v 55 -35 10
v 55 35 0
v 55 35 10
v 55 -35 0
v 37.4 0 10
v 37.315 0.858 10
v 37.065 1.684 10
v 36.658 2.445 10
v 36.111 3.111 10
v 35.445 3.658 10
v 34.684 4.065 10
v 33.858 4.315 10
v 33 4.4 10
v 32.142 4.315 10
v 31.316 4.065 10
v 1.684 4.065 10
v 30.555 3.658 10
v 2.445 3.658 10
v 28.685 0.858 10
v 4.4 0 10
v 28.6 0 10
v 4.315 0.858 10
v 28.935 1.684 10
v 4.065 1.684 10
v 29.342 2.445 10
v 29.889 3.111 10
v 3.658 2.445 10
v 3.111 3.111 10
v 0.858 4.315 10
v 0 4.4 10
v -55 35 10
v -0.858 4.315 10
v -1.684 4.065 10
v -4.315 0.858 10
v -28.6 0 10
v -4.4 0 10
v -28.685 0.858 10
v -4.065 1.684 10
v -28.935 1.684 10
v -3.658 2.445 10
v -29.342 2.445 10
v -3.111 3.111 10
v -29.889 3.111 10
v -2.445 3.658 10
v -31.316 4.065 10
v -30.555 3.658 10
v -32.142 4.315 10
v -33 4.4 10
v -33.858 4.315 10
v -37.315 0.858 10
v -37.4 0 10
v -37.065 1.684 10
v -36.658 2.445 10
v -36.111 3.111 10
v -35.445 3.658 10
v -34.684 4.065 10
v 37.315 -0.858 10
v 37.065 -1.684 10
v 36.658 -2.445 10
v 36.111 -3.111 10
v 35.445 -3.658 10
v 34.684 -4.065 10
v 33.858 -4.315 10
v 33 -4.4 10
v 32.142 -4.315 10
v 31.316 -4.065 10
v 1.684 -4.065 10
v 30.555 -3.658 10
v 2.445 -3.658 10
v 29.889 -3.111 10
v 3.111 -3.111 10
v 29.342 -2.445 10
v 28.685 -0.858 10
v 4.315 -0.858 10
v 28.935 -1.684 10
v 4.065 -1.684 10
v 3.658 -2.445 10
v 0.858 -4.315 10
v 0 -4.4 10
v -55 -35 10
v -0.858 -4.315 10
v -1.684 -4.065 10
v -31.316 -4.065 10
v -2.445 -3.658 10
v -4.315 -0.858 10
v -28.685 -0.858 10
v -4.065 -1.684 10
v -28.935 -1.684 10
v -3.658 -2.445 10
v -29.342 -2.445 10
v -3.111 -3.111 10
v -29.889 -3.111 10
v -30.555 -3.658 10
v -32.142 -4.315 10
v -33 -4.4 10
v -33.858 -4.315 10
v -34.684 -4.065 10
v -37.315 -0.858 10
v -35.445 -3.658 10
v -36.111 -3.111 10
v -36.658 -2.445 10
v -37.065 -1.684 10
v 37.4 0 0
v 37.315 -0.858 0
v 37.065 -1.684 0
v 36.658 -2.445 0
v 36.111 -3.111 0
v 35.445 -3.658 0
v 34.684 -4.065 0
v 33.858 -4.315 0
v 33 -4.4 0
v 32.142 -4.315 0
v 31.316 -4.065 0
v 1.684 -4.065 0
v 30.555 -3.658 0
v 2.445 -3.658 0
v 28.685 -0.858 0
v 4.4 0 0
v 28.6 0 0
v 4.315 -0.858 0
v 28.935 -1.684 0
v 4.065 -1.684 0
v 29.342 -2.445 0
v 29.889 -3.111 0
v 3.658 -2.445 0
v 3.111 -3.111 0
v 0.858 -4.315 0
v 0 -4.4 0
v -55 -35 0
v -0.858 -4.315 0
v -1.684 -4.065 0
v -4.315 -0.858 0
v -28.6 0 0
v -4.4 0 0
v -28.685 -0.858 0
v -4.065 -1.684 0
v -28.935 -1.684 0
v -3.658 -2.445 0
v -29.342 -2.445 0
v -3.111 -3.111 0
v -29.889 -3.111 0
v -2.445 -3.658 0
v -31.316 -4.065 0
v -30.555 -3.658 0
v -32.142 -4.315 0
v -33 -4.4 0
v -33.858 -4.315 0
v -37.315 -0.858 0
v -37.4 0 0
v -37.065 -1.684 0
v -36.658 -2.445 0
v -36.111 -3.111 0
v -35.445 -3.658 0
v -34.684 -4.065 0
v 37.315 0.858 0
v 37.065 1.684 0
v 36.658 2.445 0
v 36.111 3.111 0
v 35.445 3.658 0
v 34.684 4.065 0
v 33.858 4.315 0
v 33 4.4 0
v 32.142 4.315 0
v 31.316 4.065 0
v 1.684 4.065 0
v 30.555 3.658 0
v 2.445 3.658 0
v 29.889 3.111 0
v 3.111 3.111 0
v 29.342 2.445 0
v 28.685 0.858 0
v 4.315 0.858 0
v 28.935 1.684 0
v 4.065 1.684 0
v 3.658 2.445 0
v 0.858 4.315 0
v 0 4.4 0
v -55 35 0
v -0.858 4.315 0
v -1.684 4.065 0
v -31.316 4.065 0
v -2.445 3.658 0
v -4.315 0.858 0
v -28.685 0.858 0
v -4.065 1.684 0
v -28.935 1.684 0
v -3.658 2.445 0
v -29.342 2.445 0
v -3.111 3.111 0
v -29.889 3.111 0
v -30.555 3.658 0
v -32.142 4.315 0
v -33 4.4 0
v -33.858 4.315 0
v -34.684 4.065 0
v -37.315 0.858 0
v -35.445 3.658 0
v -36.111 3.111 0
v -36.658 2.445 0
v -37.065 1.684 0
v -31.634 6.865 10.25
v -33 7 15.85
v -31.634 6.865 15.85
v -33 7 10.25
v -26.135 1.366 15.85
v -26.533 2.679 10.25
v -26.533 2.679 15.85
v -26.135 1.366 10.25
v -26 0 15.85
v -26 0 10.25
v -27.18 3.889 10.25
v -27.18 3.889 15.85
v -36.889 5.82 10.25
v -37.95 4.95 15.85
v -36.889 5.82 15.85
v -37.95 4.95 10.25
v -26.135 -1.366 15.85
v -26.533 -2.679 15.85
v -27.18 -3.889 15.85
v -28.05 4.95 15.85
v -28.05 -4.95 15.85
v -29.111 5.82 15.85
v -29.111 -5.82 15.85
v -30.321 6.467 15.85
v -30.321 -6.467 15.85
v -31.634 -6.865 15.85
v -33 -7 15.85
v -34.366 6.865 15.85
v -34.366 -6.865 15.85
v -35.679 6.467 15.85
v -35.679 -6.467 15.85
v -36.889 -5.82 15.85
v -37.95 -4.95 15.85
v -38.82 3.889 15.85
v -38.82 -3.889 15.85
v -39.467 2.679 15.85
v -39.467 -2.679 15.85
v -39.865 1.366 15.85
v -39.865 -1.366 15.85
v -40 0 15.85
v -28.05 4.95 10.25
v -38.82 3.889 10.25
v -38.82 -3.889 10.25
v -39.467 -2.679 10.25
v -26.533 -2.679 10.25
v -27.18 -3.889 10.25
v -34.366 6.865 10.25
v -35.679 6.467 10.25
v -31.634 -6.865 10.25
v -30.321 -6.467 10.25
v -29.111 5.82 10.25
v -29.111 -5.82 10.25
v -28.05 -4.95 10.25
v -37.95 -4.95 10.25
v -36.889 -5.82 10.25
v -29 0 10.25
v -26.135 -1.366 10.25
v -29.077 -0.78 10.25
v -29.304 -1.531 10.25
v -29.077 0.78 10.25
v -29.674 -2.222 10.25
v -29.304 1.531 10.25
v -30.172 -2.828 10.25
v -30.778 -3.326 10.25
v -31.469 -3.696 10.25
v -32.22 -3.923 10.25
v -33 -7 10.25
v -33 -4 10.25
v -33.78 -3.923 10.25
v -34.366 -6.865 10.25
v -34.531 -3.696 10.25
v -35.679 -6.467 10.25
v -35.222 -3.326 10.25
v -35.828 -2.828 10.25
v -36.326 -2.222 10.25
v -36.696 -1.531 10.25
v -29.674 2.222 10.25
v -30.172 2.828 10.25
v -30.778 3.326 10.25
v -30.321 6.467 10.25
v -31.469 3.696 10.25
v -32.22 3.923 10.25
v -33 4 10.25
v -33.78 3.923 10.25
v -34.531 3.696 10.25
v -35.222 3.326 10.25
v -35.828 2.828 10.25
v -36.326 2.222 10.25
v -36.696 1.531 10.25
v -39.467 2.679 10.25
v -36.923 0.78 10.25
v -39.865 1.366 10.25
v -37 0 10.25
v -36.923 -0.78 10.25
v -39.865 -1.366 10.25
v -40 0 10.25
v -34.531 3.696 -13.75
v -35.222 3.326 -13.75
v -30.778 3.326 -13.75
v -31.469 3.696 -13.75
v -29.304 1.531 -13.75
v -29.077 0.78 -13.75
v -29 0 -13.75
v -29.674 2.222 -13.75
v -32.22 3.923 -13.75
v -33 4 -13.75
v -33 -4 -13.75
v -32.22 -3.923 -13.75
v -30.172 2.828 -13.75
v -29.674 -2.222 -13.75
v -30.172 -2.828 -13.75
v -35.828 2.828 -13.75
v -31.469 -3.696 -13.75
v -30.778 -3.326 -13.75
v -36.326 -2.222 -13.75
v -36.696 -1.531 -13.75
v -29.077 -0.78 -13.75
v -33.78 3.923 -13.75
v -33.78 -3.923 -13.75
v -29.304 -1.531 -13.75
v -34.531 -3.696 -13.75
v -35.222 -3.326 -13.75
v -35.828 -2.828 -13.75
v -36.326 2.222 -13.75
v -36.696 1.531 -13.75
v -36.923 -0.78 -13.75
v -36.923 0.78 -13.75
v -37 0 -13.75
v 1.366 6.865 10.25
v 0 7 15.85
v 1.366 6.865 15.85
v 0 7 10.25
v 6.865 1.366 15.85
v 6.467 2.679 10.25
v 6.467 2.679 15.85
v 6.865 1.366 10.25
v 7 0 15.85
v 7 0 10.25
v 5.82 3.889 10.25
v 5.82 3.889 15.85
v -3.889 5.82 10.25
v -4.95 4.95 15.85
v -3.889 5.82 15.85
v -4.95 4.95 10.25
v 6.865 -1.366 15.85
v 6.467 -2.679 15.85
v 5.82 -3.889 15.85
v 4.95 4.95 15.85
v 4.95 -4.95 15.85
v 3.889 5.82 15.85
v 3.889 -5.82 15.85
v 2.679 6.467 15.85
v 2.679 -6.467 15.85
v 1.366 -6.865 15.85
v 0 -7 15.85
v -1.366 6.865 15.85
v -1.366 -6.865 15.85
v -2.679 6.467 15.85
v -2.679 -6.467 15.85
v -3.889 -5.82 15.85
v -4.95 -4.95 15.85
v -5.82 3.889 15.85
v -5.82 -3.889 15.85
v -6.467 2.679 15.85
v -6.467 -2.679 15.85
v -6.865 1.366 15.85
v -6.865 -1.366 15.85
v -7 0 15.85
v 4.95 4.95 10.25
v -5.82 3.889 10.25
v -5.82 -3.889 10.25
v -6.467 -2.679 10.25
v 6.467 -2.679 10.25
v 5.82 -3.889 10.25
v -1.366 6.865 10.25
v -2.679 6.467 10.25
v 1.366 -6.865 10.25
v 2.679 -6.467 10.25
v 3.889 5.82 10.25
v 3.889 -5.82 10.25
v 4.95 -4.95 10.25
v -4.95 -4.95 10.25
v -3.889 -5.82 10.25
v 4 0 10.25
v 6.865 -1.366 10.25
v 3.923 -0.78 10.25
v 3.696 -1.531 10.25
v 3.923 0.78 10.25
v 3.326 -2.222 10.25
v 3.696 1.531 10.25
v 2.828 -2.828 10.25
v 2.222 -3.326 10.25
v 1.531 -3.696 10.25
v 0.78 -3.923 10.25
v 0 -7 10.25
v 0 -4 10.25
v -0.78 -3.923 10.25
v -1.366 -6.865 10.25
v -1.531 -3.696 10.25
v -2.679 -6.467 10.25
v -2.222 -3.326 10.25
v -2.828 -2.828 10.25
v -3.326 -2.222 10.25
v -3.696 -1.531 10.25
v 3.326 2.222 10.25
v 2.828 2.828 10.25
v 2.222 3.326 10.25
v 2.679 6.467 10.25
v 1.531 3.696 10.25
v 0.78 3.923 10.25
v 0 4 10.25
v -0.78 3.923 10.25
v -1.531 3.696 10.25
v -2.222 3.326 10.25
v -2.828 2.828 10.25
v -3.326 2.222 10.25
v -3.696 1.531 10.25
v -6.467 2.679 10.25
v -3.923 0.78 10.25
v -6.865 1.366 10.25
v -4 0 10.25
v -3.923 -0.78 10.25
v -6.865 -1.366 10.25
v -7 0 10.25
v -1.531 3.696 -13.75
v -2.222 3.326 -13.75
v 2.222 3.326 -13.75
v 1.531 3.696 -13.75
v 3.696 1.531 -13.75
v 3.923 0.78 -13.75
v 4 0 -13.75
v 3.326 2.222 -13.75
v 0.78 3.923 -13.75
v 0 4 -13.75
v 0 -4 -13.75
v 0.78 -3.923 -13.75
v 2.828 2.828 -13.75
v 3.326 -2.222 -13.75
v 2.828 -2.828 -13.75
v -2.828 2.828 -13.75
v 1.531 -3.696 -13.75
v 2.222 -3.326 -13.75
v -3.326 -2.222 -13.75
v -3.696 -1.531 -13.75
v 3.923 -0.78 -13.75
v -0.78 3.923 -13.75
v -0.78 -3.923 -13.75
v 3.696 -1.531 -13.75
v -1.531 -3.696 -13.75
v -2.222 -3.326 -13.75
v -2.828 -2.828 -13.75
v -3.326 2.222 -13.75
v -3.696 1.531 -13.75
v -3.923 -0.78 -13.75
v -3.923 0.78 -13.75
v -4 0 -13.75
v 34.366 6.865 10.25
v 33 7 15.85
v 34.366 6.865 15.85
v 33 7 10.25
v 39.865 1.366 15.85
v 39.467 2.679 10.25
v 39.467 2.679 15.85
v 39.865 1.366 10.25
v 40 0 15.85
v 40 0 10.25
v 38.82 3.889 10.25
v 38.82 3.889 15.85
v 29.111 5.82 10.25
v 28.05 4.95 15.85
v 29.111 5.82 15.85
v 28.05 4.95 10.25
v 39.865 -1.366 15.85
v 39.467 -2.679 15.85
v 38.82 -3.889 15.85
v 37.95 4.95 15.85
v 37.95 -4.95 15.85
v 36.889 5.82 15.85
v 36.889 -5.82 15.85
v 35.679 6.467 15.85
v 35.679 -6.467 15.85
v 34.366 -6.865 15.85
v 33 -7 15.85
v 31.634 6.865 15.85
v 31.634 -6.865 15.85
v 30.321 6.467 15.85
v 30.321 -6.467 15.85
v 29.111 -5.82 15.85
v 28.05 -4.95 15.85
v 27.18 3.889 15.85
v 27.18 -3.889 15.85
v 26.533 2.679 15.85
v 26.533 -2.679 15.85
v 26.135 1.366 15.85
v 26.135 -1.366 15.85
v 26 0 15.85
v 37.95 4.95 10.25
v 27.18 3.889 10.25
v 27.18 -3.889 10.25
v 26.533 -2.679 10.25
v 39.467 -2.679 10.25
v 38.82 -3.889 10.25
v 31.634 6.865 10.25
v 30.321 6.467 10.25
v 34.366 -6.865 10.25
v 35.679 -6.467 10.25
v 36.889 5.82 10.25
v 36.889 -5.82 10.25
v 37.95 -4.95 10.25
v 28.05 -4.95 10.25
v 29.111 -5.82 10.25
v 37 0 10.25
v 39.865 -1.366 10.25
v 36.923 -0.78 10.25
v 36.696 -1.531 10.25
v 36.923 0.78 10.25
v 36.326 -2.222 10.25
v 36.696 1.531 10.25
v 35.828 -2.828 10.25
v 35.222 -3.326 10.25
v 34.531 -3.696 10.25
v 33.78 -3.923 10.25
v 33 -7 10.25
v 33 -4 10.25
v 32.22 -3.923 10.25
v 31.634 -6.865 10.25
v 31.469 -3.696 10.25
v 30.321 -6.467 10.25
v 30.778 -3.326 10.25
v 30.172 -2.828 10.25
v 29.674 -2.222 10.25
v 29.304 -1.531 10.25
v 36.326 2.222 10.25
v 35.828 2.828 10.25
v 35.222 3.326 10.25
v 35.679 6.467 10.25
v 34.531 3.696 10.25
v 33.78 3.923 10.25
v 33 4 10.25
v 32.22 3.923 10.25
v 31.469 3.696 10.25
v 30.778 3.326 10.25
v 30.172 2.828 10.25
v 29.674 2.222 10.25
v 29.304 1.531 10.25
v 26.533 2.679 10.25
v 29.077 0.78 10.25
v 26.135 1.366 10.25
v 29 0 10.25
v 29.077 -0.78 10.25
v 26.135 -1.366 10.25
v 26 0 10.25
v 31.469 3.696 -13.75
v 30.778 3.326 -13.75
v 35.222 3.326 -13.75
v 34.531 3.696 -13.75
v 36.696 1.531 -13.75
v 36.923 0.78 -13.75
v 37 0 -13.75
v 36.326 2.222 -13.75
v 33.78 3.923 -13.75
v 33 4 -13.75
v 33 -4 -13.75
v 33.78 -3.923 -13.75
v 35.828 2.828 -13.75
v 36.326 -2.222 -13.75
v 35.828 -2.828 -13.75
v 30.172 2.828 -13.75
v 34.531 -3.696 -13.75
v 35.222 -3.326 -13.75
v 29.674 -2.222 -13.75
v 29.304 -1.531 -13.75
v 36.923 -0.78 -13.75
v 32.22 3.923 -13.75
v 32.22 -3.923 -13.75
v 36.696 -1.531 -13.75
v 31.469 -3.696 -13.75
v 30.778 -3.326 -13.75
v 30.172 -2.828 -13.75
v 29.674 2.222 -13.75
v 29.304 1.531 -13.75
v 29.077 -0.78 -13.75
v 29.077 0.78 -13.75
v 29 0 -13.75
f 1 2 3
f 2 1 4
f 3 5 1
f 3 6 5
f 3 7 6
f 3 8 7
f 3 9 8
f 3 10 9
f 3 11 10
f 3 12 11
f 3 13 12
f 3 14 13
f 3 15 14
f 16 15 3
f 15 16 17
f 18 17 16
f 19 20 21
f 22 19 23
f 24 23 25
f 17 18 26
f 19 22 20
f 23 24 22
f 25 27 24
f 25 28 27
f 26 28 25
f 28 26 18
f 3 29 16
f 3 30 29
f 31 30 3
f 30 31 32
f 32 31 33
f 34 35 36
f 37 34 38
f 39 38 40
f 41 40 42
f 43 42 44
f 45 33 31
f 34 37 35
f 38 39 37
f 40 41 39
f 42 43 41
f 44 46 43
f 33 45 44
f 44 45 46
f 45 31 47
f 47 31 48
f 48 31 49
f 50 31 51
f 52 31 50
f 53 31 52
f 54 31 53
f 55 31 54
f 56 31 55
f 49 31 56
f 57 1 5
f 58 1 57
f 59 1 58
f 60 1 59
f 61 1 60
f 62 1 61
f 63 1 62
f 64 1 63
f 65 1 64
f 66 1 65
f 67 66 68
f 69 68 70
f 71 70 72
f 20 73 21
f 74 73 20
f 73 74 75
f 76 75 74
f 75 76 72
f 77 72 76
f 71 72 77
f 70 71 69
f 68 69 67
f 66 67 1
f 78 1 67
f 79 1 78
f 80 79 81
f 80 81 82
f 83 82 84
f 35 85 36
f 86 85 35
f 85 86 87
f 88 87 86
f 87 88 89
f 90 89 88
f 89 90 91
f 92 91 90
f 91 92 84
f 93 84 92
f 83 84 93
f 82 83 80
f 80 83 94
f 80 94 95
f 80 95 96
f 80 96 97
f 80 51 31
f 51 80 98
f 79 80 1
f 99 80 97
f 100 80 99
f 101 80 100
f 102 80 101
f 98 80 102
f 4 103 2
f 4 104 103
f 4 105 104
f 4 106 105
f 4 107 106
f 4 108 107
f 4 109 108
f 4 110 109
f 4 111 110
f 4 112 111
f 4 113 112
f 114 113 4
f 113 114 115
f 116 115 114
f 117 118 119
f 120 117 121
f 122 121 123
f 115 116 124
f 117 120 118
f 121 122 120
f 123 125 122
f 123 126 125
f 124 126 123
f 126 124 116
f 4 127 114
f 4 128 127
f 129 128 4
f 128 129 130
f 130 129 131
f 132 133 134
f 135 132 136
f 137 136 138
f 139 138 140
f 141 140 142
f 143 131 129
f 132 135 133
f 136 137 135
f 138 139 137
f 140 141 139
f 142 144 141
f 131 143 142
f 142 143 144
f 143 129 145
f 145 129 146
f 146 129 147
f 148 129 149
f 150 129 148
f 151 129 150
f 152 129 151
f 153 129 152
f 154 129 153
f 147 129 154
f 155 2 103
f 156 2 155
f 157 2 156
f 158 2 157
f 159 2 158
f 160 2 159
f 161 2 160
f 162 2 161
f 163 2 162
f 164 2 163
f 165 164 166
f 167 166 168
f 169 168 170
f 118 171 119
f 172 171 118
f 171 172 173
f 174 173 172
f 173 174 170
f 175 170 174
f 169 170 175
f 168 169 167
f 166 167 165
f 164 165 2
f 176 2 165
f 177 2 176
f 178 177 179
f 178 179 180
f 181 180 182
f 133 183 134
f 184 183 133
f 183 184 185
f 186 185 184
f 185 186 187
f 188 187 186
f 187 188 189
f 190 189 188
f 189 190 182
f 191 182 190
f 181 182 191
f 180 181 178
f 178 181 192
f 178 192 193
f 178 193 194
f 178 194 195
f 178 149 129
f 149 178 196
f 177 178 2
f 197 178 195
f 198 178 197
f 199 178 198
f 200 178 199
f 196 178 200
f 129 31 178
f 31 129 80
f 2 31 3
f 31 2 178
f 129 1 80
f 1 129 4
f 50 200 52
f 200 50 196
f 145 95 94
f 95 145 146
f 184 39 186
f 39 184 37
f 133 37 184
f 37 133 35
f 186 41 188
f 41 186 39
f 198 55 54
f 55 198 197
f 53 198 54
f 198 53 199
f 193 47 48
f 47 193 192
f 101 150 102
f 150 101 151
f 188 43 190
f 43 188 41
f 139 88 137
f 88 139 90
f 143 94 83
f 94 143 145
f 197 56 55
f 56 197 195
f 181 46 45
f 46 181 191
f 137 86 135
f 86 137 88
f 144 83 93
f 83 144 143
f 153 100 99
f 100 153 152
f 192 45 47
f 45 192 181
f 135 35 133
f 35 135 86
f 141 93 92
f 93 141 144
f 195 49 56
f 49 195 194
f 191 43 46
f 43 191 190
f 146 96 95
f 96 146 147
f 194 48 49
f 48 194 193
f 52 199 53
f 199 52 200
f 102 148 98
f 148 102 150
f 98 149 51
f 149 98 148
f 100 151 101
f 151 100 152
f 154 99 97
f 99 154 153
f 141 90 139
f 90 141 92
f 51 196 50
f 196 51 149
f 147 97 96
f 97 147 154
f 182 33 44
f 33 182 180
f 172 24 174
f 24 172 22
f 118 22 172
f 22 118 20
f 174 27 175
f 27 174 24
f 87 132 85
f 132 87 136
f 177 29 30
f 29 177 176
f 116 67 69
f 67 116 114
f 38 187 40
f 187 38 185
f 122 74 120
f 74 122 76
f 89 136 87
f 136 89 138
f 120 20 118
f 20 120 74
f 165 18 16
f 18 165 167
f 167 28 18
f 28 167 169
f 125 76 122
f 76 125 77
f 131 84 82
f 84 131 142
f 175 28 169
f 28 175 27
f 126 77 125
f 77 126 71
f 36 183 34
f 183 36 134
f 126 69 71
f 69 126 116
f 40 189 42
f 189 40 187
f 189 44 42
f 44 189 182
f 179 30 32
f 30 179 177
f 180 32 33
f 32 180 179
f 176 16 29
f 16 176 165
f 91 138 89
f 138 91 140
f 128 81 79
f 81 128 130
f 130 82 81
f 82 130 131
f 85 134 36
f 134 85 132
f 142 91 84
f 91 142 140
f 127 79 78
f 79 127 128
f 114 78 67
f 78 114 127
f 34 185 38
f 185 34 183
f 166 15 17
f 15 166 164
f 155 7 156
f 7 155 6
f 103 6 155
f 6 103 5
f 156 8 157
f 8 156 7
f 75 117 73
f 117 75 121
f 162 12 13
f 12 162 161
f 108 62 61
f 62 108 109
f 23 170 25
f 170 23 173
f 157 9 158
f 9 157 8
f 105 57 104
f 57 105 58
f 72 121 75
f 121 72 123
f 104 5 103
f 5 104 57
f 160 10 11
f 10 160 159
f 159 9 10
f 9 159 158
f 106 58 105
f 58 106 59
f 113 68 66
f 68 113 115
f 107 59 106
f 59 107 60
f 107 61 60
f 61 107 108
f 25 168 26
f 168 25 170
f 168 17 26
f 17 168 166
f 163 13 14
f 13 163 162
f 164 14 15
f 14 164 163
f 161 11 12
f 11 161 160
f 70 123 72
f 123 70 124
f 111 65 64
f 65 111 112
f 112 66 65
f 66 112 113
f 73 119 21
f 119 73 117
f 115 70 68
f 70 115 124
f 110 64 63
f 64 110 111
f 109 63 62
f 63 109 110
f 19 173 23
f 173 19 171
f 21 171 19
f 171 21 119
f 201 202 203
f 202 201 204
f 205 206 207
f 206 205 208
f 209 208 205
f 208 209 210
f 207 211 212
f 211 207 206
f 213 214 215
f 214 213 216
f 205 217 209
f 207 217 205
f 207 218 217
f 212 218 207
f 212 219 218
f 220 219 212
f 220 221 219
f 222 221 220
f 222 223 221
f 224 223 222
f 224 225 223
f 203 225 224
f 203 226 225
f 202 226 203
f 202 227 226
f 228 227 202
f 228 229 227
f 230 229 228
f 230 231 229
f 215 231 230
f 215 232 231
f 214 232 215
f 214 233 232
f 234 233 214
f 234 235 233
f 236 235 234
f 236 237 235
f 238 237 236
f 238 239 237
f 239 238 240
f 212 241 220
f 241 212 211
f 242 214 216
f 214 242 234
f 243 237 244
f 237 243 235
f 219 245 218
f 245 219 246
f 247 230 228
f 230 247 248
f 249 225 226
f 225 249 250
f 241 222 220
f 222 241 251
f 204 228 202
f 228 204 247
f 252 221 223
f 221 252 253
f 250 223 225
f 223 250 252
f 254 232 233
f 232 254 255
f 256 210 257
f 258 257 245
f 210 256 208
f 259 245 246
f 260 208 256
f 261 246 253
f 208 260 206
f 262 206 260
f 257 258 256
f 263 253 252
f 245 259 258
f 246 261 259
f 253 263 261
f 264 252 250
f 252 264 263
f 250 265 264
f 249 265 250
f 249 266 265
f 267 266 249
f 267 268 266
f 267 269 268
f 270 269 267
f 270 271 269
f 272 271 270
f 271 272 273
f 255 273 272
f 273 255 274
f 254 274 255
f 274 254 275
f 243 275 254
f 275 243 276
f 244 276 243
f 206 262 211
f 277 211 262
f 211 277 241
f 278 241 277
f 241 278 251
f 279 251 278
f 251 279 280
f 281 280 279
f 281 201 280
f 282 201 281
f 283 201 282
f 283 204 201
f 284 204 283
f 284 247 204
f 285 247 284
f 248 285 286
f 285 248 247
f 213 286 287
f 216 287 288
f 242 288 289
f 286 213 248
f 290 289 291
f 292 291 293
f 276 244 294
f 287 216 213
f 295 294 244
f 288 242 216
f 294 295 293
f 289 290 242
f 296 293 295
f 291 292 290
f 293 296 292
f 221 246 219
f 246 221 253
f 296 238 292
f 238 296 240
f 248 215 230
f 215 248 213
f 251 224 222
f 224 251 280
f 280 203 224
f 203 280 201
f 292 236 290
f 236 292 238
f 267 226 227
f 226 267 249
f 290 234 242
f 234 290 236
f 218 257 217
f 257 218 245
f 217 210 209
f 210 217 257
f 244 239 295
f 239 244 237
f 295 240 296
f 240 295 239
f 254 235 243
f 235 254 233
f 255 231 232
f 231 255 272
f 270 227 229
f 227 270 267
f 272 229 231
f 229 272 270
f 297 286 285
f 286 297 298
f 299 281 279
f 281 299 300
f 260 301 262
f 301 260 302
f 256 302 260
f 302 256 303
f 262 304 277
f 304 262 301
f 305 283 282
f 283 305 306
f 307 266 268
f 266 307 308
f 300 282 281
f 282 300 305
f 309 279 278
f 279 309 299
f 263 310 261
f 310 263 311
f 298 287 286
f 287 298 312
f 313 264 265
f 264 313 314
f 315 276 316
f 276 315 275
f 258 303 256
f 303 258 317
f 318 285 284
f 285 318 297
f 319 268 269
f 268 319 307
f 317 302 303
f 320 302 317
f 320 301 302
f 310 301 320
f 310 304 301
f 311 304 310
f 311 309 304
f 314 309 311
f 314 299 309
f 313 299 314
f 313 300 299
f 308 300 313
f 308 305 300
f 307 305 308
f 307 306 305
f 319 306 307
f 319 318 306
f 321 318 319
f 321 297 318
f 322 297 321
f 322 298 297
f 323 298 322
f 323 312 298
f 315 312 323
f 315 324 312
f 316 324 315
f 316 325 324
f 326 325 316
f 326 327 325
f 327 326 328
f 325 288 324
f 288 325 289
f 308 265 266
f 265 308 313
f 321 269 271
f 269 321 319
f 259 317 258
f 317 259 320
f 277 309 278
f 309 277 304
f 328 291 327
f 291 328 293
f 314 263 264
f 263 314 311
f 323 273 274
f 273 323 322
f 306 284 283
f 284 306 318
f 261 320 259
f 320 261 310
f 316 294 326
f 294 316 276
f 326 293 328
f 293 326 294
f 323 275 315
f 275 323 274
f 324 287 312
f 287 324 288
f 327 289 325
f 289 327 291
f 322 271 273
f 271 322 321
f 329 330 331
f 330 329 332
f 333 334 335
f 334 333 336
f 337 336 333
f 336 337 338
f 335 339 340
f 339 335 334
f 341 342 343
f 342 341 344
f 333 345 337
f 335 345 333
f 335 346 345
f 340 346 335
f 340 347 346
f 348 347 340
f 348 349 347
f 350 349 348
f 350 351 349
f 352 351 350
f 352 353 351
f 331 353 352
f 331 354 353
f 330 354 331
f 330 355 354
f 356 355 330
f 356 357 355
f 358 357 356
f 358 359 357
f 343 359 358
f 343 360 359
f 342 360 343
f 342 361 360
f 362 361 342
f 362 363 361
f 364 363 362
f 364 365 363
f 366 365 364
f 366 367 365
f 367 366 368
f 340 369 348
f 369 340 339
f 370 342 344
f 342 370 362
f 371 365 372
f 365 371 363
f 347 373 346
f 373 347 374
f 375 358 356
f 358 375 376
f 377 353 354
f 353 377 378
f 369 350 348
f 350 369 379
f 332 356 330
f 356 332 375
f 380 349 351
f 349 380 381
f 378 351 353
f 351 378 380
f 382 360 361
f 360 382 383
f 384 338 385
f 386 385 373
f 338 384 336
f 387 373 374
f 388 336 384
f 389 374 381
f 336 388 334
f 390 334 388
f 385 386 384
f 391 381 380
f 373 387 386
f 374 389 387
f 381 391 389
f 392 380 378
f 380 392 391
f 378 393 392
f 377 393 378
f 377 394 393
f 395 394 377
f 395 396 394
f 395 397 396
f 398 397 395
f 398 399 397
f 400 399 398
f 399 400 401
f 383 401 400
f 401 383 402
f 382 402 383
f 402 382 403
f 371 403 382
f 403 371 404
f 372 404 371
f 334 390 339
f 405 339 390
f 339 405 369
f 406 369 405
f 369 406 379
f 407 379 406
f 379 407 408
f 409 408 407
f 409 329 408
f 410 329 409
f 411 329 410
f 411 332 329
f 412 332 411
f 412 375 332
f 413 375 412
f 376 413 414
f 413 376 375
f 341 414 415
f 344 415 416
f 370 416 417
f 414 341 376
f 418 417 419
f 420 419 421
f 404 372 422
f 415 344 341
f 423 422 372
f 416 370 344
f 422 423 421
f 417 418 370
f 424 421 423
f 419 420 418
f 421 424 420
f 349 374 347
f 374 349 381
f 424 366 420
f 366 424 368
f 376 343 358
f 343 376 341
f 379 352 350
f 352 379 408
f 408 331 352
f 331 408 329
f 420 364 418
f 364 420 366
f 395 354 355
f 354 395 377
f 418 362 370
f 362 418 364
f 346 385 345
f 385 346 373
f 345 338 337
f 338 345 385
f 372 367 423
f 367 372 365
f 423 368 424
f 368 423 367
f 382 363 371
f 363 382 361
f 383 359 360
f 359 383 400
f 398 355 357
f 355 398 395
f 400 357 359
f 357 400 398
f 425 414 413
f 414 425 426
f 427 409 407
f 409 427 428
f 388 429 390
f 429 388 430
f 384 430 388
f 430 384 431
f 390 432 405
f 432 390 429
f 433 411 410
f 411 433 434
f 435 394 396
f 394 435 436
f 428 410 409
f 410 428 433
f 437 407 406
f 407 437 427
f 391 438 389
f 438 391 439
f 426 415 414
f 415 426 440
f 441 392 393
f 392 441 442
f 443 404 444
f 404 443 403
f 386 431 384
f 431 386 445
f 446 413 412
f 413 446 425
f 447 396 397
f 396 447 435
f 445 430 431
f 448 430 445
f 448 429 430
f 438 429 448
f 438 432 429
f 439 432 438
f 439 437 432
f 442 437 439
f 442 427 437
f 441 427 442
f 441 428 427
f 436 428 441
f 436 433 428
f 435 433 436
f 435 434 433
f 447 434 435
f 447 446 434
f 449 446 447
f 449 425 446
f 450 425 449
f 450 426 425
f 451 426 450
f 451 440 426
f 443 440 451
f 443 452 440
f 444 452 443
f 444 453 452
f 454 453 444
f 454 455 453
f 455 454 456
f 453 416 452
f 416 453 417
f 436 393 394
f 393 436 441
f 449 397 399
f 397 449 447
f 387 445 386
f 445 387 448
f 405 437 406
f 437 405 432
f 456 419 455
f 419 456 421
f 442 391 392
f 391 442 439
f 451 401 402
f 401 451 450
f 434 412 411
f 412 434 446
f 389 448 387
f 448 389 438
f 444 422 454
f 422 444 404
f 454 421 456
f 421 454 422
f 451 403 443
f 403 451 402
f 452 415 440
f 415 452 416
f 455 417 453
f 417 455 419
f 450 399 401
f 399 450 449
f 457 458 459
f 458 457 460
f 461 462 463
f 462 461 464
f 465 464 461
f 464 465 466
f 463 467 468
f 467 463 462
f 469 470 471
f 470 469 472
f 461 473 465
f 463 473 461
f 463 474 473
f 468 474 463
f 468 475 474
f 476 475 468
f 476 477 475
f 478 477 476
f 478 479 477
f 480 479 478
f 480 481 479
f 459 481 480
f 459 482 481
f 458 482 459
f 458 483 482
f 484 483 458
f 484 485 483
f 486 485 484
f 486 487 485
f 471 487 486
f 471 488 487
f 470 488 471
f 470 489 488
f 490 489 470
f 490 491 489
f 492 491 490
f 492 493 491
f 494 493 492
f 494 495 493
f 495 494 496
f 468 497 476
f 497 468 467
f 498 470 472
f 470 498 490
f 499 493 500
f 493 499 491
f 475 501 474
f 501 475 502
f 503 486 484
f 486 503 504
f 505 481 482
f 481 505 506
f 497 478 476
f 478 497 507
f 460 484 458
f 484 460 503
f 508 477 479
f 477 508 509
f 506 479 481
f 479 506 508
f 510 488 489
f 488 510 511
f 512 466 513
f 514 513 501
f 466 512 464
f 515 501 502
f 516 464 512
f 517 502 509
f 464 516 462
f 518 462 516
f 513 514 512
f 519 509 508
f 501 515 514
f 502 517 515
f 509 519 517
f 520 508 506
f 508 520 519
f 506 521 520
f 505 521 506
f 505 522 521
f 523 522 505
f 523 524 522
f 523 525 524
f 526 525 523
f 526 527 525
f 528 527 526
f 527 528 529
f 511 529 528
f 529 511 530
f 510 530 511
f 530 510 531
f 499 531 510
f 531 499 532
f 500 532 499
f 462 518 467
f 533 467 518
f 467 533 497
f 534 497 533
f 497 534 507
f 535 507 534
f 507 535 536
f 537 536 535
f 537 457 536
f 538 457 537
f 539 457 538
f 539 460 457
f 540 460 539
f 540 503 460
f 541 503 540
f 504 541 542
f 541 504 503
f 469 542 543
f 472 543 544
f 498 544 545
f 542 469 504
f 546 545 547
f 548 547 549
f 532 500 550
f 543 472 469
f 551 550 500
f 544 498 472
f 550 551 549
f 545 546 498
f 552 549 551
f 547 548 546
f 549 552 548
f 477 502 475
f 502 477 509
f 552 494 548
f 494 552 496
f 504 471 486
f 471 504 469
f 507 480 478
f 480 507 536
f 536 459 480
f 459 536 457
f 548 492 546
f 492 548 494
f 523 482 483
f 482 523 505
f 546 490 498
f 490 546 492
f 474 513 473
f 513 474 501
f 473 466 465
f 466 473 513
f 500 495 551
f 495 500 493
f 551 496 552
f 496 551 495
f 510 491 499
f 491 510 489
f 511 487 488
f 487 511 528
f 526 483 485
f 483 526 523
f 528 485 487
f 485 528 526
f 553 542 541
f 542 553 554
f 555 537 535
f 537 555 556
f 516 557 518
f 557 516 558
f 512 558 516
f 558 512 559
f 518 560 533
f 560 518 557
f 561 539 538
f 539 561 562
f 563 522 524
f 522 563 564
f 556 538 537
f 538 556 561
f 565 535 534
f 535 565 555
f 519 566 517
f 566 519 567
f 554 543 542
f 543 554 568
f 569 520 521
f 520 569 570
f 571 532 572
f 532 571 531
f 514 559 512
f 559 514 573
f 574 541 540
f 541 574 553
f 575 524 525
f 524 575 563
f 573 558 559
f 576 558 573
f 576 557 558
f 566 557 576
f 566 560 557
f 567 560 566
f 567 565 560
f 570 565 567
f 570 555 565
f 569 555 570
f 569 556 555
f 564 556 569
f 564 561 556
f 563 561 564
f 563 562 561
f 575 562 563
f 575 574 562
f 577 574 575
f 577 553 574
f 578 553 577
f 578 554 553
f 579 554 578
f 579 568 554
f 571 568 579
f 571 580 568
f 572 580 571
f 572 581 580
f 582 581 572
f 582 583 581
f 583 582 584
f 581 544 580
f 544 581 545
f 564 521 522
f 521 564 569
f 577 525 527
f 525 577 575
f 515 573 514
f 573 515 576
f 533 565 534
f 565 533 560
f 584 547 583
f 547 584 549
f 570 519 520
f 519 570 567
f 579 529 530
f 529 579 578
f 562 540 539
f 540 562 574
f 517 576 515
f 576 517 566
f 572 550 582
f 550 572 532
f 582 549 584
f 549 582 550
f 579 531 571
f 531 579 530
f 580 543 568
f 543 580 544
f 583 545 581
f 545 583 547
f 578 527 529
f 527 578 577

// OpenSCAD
$fn = 32;

// ------------------------------------------------------------------------
// Bolted plate: 110 x 70 x 10 mm plate, 3 fasteners
// Every part is its own module, assembly() places them once.
// ------------------------------------------------------------------------

// --- part 1 ---
module plate() {
  difference() {
    translate([-55, -35, 0]) cube([110, 70, 10]);
    translate([-33, 0, -1]) cylinder(h = 12, d = 8.8);
    translate([0, 0, -1]) cylinder(h = 12, d = 8.8);
    translate([33, 0, -1]) cylinder(h = 12, d = 8.8);
  }
}

// --- part 2 ---
module bolt1() {
  cylinder(h = 5.6, d = 14);
  translate([0, 0, -24]) cylinder(h = 24, d = 8);
}

// --- part 3 ---
module bolt2() {
  cylinder(h = 5.6, d = 14);
  translate([0, 0, -24]) cylinder(h = 24, d = 8);
}

// --- part 4 ---
module bolt3() {
  cylinder(h = 5.6, d = 14);
  translate([0, 0, -24]) cylinder(h = 24, d = 8);
}

// --- assembly ---
module assembly() {
  translate([0, 0, 0]) rotate([0, 0, 0]) plate();
  translate([-33, 0, 10.25]) rotate([0, 0, 0]) bolt1();
  translate([0, 0, 10.25]) rotate([0, 0, 0]) bolt2();
  translate([33, 0, 10.25]) rotate([0, 0, 0]) bolt3();
}

assembly();
